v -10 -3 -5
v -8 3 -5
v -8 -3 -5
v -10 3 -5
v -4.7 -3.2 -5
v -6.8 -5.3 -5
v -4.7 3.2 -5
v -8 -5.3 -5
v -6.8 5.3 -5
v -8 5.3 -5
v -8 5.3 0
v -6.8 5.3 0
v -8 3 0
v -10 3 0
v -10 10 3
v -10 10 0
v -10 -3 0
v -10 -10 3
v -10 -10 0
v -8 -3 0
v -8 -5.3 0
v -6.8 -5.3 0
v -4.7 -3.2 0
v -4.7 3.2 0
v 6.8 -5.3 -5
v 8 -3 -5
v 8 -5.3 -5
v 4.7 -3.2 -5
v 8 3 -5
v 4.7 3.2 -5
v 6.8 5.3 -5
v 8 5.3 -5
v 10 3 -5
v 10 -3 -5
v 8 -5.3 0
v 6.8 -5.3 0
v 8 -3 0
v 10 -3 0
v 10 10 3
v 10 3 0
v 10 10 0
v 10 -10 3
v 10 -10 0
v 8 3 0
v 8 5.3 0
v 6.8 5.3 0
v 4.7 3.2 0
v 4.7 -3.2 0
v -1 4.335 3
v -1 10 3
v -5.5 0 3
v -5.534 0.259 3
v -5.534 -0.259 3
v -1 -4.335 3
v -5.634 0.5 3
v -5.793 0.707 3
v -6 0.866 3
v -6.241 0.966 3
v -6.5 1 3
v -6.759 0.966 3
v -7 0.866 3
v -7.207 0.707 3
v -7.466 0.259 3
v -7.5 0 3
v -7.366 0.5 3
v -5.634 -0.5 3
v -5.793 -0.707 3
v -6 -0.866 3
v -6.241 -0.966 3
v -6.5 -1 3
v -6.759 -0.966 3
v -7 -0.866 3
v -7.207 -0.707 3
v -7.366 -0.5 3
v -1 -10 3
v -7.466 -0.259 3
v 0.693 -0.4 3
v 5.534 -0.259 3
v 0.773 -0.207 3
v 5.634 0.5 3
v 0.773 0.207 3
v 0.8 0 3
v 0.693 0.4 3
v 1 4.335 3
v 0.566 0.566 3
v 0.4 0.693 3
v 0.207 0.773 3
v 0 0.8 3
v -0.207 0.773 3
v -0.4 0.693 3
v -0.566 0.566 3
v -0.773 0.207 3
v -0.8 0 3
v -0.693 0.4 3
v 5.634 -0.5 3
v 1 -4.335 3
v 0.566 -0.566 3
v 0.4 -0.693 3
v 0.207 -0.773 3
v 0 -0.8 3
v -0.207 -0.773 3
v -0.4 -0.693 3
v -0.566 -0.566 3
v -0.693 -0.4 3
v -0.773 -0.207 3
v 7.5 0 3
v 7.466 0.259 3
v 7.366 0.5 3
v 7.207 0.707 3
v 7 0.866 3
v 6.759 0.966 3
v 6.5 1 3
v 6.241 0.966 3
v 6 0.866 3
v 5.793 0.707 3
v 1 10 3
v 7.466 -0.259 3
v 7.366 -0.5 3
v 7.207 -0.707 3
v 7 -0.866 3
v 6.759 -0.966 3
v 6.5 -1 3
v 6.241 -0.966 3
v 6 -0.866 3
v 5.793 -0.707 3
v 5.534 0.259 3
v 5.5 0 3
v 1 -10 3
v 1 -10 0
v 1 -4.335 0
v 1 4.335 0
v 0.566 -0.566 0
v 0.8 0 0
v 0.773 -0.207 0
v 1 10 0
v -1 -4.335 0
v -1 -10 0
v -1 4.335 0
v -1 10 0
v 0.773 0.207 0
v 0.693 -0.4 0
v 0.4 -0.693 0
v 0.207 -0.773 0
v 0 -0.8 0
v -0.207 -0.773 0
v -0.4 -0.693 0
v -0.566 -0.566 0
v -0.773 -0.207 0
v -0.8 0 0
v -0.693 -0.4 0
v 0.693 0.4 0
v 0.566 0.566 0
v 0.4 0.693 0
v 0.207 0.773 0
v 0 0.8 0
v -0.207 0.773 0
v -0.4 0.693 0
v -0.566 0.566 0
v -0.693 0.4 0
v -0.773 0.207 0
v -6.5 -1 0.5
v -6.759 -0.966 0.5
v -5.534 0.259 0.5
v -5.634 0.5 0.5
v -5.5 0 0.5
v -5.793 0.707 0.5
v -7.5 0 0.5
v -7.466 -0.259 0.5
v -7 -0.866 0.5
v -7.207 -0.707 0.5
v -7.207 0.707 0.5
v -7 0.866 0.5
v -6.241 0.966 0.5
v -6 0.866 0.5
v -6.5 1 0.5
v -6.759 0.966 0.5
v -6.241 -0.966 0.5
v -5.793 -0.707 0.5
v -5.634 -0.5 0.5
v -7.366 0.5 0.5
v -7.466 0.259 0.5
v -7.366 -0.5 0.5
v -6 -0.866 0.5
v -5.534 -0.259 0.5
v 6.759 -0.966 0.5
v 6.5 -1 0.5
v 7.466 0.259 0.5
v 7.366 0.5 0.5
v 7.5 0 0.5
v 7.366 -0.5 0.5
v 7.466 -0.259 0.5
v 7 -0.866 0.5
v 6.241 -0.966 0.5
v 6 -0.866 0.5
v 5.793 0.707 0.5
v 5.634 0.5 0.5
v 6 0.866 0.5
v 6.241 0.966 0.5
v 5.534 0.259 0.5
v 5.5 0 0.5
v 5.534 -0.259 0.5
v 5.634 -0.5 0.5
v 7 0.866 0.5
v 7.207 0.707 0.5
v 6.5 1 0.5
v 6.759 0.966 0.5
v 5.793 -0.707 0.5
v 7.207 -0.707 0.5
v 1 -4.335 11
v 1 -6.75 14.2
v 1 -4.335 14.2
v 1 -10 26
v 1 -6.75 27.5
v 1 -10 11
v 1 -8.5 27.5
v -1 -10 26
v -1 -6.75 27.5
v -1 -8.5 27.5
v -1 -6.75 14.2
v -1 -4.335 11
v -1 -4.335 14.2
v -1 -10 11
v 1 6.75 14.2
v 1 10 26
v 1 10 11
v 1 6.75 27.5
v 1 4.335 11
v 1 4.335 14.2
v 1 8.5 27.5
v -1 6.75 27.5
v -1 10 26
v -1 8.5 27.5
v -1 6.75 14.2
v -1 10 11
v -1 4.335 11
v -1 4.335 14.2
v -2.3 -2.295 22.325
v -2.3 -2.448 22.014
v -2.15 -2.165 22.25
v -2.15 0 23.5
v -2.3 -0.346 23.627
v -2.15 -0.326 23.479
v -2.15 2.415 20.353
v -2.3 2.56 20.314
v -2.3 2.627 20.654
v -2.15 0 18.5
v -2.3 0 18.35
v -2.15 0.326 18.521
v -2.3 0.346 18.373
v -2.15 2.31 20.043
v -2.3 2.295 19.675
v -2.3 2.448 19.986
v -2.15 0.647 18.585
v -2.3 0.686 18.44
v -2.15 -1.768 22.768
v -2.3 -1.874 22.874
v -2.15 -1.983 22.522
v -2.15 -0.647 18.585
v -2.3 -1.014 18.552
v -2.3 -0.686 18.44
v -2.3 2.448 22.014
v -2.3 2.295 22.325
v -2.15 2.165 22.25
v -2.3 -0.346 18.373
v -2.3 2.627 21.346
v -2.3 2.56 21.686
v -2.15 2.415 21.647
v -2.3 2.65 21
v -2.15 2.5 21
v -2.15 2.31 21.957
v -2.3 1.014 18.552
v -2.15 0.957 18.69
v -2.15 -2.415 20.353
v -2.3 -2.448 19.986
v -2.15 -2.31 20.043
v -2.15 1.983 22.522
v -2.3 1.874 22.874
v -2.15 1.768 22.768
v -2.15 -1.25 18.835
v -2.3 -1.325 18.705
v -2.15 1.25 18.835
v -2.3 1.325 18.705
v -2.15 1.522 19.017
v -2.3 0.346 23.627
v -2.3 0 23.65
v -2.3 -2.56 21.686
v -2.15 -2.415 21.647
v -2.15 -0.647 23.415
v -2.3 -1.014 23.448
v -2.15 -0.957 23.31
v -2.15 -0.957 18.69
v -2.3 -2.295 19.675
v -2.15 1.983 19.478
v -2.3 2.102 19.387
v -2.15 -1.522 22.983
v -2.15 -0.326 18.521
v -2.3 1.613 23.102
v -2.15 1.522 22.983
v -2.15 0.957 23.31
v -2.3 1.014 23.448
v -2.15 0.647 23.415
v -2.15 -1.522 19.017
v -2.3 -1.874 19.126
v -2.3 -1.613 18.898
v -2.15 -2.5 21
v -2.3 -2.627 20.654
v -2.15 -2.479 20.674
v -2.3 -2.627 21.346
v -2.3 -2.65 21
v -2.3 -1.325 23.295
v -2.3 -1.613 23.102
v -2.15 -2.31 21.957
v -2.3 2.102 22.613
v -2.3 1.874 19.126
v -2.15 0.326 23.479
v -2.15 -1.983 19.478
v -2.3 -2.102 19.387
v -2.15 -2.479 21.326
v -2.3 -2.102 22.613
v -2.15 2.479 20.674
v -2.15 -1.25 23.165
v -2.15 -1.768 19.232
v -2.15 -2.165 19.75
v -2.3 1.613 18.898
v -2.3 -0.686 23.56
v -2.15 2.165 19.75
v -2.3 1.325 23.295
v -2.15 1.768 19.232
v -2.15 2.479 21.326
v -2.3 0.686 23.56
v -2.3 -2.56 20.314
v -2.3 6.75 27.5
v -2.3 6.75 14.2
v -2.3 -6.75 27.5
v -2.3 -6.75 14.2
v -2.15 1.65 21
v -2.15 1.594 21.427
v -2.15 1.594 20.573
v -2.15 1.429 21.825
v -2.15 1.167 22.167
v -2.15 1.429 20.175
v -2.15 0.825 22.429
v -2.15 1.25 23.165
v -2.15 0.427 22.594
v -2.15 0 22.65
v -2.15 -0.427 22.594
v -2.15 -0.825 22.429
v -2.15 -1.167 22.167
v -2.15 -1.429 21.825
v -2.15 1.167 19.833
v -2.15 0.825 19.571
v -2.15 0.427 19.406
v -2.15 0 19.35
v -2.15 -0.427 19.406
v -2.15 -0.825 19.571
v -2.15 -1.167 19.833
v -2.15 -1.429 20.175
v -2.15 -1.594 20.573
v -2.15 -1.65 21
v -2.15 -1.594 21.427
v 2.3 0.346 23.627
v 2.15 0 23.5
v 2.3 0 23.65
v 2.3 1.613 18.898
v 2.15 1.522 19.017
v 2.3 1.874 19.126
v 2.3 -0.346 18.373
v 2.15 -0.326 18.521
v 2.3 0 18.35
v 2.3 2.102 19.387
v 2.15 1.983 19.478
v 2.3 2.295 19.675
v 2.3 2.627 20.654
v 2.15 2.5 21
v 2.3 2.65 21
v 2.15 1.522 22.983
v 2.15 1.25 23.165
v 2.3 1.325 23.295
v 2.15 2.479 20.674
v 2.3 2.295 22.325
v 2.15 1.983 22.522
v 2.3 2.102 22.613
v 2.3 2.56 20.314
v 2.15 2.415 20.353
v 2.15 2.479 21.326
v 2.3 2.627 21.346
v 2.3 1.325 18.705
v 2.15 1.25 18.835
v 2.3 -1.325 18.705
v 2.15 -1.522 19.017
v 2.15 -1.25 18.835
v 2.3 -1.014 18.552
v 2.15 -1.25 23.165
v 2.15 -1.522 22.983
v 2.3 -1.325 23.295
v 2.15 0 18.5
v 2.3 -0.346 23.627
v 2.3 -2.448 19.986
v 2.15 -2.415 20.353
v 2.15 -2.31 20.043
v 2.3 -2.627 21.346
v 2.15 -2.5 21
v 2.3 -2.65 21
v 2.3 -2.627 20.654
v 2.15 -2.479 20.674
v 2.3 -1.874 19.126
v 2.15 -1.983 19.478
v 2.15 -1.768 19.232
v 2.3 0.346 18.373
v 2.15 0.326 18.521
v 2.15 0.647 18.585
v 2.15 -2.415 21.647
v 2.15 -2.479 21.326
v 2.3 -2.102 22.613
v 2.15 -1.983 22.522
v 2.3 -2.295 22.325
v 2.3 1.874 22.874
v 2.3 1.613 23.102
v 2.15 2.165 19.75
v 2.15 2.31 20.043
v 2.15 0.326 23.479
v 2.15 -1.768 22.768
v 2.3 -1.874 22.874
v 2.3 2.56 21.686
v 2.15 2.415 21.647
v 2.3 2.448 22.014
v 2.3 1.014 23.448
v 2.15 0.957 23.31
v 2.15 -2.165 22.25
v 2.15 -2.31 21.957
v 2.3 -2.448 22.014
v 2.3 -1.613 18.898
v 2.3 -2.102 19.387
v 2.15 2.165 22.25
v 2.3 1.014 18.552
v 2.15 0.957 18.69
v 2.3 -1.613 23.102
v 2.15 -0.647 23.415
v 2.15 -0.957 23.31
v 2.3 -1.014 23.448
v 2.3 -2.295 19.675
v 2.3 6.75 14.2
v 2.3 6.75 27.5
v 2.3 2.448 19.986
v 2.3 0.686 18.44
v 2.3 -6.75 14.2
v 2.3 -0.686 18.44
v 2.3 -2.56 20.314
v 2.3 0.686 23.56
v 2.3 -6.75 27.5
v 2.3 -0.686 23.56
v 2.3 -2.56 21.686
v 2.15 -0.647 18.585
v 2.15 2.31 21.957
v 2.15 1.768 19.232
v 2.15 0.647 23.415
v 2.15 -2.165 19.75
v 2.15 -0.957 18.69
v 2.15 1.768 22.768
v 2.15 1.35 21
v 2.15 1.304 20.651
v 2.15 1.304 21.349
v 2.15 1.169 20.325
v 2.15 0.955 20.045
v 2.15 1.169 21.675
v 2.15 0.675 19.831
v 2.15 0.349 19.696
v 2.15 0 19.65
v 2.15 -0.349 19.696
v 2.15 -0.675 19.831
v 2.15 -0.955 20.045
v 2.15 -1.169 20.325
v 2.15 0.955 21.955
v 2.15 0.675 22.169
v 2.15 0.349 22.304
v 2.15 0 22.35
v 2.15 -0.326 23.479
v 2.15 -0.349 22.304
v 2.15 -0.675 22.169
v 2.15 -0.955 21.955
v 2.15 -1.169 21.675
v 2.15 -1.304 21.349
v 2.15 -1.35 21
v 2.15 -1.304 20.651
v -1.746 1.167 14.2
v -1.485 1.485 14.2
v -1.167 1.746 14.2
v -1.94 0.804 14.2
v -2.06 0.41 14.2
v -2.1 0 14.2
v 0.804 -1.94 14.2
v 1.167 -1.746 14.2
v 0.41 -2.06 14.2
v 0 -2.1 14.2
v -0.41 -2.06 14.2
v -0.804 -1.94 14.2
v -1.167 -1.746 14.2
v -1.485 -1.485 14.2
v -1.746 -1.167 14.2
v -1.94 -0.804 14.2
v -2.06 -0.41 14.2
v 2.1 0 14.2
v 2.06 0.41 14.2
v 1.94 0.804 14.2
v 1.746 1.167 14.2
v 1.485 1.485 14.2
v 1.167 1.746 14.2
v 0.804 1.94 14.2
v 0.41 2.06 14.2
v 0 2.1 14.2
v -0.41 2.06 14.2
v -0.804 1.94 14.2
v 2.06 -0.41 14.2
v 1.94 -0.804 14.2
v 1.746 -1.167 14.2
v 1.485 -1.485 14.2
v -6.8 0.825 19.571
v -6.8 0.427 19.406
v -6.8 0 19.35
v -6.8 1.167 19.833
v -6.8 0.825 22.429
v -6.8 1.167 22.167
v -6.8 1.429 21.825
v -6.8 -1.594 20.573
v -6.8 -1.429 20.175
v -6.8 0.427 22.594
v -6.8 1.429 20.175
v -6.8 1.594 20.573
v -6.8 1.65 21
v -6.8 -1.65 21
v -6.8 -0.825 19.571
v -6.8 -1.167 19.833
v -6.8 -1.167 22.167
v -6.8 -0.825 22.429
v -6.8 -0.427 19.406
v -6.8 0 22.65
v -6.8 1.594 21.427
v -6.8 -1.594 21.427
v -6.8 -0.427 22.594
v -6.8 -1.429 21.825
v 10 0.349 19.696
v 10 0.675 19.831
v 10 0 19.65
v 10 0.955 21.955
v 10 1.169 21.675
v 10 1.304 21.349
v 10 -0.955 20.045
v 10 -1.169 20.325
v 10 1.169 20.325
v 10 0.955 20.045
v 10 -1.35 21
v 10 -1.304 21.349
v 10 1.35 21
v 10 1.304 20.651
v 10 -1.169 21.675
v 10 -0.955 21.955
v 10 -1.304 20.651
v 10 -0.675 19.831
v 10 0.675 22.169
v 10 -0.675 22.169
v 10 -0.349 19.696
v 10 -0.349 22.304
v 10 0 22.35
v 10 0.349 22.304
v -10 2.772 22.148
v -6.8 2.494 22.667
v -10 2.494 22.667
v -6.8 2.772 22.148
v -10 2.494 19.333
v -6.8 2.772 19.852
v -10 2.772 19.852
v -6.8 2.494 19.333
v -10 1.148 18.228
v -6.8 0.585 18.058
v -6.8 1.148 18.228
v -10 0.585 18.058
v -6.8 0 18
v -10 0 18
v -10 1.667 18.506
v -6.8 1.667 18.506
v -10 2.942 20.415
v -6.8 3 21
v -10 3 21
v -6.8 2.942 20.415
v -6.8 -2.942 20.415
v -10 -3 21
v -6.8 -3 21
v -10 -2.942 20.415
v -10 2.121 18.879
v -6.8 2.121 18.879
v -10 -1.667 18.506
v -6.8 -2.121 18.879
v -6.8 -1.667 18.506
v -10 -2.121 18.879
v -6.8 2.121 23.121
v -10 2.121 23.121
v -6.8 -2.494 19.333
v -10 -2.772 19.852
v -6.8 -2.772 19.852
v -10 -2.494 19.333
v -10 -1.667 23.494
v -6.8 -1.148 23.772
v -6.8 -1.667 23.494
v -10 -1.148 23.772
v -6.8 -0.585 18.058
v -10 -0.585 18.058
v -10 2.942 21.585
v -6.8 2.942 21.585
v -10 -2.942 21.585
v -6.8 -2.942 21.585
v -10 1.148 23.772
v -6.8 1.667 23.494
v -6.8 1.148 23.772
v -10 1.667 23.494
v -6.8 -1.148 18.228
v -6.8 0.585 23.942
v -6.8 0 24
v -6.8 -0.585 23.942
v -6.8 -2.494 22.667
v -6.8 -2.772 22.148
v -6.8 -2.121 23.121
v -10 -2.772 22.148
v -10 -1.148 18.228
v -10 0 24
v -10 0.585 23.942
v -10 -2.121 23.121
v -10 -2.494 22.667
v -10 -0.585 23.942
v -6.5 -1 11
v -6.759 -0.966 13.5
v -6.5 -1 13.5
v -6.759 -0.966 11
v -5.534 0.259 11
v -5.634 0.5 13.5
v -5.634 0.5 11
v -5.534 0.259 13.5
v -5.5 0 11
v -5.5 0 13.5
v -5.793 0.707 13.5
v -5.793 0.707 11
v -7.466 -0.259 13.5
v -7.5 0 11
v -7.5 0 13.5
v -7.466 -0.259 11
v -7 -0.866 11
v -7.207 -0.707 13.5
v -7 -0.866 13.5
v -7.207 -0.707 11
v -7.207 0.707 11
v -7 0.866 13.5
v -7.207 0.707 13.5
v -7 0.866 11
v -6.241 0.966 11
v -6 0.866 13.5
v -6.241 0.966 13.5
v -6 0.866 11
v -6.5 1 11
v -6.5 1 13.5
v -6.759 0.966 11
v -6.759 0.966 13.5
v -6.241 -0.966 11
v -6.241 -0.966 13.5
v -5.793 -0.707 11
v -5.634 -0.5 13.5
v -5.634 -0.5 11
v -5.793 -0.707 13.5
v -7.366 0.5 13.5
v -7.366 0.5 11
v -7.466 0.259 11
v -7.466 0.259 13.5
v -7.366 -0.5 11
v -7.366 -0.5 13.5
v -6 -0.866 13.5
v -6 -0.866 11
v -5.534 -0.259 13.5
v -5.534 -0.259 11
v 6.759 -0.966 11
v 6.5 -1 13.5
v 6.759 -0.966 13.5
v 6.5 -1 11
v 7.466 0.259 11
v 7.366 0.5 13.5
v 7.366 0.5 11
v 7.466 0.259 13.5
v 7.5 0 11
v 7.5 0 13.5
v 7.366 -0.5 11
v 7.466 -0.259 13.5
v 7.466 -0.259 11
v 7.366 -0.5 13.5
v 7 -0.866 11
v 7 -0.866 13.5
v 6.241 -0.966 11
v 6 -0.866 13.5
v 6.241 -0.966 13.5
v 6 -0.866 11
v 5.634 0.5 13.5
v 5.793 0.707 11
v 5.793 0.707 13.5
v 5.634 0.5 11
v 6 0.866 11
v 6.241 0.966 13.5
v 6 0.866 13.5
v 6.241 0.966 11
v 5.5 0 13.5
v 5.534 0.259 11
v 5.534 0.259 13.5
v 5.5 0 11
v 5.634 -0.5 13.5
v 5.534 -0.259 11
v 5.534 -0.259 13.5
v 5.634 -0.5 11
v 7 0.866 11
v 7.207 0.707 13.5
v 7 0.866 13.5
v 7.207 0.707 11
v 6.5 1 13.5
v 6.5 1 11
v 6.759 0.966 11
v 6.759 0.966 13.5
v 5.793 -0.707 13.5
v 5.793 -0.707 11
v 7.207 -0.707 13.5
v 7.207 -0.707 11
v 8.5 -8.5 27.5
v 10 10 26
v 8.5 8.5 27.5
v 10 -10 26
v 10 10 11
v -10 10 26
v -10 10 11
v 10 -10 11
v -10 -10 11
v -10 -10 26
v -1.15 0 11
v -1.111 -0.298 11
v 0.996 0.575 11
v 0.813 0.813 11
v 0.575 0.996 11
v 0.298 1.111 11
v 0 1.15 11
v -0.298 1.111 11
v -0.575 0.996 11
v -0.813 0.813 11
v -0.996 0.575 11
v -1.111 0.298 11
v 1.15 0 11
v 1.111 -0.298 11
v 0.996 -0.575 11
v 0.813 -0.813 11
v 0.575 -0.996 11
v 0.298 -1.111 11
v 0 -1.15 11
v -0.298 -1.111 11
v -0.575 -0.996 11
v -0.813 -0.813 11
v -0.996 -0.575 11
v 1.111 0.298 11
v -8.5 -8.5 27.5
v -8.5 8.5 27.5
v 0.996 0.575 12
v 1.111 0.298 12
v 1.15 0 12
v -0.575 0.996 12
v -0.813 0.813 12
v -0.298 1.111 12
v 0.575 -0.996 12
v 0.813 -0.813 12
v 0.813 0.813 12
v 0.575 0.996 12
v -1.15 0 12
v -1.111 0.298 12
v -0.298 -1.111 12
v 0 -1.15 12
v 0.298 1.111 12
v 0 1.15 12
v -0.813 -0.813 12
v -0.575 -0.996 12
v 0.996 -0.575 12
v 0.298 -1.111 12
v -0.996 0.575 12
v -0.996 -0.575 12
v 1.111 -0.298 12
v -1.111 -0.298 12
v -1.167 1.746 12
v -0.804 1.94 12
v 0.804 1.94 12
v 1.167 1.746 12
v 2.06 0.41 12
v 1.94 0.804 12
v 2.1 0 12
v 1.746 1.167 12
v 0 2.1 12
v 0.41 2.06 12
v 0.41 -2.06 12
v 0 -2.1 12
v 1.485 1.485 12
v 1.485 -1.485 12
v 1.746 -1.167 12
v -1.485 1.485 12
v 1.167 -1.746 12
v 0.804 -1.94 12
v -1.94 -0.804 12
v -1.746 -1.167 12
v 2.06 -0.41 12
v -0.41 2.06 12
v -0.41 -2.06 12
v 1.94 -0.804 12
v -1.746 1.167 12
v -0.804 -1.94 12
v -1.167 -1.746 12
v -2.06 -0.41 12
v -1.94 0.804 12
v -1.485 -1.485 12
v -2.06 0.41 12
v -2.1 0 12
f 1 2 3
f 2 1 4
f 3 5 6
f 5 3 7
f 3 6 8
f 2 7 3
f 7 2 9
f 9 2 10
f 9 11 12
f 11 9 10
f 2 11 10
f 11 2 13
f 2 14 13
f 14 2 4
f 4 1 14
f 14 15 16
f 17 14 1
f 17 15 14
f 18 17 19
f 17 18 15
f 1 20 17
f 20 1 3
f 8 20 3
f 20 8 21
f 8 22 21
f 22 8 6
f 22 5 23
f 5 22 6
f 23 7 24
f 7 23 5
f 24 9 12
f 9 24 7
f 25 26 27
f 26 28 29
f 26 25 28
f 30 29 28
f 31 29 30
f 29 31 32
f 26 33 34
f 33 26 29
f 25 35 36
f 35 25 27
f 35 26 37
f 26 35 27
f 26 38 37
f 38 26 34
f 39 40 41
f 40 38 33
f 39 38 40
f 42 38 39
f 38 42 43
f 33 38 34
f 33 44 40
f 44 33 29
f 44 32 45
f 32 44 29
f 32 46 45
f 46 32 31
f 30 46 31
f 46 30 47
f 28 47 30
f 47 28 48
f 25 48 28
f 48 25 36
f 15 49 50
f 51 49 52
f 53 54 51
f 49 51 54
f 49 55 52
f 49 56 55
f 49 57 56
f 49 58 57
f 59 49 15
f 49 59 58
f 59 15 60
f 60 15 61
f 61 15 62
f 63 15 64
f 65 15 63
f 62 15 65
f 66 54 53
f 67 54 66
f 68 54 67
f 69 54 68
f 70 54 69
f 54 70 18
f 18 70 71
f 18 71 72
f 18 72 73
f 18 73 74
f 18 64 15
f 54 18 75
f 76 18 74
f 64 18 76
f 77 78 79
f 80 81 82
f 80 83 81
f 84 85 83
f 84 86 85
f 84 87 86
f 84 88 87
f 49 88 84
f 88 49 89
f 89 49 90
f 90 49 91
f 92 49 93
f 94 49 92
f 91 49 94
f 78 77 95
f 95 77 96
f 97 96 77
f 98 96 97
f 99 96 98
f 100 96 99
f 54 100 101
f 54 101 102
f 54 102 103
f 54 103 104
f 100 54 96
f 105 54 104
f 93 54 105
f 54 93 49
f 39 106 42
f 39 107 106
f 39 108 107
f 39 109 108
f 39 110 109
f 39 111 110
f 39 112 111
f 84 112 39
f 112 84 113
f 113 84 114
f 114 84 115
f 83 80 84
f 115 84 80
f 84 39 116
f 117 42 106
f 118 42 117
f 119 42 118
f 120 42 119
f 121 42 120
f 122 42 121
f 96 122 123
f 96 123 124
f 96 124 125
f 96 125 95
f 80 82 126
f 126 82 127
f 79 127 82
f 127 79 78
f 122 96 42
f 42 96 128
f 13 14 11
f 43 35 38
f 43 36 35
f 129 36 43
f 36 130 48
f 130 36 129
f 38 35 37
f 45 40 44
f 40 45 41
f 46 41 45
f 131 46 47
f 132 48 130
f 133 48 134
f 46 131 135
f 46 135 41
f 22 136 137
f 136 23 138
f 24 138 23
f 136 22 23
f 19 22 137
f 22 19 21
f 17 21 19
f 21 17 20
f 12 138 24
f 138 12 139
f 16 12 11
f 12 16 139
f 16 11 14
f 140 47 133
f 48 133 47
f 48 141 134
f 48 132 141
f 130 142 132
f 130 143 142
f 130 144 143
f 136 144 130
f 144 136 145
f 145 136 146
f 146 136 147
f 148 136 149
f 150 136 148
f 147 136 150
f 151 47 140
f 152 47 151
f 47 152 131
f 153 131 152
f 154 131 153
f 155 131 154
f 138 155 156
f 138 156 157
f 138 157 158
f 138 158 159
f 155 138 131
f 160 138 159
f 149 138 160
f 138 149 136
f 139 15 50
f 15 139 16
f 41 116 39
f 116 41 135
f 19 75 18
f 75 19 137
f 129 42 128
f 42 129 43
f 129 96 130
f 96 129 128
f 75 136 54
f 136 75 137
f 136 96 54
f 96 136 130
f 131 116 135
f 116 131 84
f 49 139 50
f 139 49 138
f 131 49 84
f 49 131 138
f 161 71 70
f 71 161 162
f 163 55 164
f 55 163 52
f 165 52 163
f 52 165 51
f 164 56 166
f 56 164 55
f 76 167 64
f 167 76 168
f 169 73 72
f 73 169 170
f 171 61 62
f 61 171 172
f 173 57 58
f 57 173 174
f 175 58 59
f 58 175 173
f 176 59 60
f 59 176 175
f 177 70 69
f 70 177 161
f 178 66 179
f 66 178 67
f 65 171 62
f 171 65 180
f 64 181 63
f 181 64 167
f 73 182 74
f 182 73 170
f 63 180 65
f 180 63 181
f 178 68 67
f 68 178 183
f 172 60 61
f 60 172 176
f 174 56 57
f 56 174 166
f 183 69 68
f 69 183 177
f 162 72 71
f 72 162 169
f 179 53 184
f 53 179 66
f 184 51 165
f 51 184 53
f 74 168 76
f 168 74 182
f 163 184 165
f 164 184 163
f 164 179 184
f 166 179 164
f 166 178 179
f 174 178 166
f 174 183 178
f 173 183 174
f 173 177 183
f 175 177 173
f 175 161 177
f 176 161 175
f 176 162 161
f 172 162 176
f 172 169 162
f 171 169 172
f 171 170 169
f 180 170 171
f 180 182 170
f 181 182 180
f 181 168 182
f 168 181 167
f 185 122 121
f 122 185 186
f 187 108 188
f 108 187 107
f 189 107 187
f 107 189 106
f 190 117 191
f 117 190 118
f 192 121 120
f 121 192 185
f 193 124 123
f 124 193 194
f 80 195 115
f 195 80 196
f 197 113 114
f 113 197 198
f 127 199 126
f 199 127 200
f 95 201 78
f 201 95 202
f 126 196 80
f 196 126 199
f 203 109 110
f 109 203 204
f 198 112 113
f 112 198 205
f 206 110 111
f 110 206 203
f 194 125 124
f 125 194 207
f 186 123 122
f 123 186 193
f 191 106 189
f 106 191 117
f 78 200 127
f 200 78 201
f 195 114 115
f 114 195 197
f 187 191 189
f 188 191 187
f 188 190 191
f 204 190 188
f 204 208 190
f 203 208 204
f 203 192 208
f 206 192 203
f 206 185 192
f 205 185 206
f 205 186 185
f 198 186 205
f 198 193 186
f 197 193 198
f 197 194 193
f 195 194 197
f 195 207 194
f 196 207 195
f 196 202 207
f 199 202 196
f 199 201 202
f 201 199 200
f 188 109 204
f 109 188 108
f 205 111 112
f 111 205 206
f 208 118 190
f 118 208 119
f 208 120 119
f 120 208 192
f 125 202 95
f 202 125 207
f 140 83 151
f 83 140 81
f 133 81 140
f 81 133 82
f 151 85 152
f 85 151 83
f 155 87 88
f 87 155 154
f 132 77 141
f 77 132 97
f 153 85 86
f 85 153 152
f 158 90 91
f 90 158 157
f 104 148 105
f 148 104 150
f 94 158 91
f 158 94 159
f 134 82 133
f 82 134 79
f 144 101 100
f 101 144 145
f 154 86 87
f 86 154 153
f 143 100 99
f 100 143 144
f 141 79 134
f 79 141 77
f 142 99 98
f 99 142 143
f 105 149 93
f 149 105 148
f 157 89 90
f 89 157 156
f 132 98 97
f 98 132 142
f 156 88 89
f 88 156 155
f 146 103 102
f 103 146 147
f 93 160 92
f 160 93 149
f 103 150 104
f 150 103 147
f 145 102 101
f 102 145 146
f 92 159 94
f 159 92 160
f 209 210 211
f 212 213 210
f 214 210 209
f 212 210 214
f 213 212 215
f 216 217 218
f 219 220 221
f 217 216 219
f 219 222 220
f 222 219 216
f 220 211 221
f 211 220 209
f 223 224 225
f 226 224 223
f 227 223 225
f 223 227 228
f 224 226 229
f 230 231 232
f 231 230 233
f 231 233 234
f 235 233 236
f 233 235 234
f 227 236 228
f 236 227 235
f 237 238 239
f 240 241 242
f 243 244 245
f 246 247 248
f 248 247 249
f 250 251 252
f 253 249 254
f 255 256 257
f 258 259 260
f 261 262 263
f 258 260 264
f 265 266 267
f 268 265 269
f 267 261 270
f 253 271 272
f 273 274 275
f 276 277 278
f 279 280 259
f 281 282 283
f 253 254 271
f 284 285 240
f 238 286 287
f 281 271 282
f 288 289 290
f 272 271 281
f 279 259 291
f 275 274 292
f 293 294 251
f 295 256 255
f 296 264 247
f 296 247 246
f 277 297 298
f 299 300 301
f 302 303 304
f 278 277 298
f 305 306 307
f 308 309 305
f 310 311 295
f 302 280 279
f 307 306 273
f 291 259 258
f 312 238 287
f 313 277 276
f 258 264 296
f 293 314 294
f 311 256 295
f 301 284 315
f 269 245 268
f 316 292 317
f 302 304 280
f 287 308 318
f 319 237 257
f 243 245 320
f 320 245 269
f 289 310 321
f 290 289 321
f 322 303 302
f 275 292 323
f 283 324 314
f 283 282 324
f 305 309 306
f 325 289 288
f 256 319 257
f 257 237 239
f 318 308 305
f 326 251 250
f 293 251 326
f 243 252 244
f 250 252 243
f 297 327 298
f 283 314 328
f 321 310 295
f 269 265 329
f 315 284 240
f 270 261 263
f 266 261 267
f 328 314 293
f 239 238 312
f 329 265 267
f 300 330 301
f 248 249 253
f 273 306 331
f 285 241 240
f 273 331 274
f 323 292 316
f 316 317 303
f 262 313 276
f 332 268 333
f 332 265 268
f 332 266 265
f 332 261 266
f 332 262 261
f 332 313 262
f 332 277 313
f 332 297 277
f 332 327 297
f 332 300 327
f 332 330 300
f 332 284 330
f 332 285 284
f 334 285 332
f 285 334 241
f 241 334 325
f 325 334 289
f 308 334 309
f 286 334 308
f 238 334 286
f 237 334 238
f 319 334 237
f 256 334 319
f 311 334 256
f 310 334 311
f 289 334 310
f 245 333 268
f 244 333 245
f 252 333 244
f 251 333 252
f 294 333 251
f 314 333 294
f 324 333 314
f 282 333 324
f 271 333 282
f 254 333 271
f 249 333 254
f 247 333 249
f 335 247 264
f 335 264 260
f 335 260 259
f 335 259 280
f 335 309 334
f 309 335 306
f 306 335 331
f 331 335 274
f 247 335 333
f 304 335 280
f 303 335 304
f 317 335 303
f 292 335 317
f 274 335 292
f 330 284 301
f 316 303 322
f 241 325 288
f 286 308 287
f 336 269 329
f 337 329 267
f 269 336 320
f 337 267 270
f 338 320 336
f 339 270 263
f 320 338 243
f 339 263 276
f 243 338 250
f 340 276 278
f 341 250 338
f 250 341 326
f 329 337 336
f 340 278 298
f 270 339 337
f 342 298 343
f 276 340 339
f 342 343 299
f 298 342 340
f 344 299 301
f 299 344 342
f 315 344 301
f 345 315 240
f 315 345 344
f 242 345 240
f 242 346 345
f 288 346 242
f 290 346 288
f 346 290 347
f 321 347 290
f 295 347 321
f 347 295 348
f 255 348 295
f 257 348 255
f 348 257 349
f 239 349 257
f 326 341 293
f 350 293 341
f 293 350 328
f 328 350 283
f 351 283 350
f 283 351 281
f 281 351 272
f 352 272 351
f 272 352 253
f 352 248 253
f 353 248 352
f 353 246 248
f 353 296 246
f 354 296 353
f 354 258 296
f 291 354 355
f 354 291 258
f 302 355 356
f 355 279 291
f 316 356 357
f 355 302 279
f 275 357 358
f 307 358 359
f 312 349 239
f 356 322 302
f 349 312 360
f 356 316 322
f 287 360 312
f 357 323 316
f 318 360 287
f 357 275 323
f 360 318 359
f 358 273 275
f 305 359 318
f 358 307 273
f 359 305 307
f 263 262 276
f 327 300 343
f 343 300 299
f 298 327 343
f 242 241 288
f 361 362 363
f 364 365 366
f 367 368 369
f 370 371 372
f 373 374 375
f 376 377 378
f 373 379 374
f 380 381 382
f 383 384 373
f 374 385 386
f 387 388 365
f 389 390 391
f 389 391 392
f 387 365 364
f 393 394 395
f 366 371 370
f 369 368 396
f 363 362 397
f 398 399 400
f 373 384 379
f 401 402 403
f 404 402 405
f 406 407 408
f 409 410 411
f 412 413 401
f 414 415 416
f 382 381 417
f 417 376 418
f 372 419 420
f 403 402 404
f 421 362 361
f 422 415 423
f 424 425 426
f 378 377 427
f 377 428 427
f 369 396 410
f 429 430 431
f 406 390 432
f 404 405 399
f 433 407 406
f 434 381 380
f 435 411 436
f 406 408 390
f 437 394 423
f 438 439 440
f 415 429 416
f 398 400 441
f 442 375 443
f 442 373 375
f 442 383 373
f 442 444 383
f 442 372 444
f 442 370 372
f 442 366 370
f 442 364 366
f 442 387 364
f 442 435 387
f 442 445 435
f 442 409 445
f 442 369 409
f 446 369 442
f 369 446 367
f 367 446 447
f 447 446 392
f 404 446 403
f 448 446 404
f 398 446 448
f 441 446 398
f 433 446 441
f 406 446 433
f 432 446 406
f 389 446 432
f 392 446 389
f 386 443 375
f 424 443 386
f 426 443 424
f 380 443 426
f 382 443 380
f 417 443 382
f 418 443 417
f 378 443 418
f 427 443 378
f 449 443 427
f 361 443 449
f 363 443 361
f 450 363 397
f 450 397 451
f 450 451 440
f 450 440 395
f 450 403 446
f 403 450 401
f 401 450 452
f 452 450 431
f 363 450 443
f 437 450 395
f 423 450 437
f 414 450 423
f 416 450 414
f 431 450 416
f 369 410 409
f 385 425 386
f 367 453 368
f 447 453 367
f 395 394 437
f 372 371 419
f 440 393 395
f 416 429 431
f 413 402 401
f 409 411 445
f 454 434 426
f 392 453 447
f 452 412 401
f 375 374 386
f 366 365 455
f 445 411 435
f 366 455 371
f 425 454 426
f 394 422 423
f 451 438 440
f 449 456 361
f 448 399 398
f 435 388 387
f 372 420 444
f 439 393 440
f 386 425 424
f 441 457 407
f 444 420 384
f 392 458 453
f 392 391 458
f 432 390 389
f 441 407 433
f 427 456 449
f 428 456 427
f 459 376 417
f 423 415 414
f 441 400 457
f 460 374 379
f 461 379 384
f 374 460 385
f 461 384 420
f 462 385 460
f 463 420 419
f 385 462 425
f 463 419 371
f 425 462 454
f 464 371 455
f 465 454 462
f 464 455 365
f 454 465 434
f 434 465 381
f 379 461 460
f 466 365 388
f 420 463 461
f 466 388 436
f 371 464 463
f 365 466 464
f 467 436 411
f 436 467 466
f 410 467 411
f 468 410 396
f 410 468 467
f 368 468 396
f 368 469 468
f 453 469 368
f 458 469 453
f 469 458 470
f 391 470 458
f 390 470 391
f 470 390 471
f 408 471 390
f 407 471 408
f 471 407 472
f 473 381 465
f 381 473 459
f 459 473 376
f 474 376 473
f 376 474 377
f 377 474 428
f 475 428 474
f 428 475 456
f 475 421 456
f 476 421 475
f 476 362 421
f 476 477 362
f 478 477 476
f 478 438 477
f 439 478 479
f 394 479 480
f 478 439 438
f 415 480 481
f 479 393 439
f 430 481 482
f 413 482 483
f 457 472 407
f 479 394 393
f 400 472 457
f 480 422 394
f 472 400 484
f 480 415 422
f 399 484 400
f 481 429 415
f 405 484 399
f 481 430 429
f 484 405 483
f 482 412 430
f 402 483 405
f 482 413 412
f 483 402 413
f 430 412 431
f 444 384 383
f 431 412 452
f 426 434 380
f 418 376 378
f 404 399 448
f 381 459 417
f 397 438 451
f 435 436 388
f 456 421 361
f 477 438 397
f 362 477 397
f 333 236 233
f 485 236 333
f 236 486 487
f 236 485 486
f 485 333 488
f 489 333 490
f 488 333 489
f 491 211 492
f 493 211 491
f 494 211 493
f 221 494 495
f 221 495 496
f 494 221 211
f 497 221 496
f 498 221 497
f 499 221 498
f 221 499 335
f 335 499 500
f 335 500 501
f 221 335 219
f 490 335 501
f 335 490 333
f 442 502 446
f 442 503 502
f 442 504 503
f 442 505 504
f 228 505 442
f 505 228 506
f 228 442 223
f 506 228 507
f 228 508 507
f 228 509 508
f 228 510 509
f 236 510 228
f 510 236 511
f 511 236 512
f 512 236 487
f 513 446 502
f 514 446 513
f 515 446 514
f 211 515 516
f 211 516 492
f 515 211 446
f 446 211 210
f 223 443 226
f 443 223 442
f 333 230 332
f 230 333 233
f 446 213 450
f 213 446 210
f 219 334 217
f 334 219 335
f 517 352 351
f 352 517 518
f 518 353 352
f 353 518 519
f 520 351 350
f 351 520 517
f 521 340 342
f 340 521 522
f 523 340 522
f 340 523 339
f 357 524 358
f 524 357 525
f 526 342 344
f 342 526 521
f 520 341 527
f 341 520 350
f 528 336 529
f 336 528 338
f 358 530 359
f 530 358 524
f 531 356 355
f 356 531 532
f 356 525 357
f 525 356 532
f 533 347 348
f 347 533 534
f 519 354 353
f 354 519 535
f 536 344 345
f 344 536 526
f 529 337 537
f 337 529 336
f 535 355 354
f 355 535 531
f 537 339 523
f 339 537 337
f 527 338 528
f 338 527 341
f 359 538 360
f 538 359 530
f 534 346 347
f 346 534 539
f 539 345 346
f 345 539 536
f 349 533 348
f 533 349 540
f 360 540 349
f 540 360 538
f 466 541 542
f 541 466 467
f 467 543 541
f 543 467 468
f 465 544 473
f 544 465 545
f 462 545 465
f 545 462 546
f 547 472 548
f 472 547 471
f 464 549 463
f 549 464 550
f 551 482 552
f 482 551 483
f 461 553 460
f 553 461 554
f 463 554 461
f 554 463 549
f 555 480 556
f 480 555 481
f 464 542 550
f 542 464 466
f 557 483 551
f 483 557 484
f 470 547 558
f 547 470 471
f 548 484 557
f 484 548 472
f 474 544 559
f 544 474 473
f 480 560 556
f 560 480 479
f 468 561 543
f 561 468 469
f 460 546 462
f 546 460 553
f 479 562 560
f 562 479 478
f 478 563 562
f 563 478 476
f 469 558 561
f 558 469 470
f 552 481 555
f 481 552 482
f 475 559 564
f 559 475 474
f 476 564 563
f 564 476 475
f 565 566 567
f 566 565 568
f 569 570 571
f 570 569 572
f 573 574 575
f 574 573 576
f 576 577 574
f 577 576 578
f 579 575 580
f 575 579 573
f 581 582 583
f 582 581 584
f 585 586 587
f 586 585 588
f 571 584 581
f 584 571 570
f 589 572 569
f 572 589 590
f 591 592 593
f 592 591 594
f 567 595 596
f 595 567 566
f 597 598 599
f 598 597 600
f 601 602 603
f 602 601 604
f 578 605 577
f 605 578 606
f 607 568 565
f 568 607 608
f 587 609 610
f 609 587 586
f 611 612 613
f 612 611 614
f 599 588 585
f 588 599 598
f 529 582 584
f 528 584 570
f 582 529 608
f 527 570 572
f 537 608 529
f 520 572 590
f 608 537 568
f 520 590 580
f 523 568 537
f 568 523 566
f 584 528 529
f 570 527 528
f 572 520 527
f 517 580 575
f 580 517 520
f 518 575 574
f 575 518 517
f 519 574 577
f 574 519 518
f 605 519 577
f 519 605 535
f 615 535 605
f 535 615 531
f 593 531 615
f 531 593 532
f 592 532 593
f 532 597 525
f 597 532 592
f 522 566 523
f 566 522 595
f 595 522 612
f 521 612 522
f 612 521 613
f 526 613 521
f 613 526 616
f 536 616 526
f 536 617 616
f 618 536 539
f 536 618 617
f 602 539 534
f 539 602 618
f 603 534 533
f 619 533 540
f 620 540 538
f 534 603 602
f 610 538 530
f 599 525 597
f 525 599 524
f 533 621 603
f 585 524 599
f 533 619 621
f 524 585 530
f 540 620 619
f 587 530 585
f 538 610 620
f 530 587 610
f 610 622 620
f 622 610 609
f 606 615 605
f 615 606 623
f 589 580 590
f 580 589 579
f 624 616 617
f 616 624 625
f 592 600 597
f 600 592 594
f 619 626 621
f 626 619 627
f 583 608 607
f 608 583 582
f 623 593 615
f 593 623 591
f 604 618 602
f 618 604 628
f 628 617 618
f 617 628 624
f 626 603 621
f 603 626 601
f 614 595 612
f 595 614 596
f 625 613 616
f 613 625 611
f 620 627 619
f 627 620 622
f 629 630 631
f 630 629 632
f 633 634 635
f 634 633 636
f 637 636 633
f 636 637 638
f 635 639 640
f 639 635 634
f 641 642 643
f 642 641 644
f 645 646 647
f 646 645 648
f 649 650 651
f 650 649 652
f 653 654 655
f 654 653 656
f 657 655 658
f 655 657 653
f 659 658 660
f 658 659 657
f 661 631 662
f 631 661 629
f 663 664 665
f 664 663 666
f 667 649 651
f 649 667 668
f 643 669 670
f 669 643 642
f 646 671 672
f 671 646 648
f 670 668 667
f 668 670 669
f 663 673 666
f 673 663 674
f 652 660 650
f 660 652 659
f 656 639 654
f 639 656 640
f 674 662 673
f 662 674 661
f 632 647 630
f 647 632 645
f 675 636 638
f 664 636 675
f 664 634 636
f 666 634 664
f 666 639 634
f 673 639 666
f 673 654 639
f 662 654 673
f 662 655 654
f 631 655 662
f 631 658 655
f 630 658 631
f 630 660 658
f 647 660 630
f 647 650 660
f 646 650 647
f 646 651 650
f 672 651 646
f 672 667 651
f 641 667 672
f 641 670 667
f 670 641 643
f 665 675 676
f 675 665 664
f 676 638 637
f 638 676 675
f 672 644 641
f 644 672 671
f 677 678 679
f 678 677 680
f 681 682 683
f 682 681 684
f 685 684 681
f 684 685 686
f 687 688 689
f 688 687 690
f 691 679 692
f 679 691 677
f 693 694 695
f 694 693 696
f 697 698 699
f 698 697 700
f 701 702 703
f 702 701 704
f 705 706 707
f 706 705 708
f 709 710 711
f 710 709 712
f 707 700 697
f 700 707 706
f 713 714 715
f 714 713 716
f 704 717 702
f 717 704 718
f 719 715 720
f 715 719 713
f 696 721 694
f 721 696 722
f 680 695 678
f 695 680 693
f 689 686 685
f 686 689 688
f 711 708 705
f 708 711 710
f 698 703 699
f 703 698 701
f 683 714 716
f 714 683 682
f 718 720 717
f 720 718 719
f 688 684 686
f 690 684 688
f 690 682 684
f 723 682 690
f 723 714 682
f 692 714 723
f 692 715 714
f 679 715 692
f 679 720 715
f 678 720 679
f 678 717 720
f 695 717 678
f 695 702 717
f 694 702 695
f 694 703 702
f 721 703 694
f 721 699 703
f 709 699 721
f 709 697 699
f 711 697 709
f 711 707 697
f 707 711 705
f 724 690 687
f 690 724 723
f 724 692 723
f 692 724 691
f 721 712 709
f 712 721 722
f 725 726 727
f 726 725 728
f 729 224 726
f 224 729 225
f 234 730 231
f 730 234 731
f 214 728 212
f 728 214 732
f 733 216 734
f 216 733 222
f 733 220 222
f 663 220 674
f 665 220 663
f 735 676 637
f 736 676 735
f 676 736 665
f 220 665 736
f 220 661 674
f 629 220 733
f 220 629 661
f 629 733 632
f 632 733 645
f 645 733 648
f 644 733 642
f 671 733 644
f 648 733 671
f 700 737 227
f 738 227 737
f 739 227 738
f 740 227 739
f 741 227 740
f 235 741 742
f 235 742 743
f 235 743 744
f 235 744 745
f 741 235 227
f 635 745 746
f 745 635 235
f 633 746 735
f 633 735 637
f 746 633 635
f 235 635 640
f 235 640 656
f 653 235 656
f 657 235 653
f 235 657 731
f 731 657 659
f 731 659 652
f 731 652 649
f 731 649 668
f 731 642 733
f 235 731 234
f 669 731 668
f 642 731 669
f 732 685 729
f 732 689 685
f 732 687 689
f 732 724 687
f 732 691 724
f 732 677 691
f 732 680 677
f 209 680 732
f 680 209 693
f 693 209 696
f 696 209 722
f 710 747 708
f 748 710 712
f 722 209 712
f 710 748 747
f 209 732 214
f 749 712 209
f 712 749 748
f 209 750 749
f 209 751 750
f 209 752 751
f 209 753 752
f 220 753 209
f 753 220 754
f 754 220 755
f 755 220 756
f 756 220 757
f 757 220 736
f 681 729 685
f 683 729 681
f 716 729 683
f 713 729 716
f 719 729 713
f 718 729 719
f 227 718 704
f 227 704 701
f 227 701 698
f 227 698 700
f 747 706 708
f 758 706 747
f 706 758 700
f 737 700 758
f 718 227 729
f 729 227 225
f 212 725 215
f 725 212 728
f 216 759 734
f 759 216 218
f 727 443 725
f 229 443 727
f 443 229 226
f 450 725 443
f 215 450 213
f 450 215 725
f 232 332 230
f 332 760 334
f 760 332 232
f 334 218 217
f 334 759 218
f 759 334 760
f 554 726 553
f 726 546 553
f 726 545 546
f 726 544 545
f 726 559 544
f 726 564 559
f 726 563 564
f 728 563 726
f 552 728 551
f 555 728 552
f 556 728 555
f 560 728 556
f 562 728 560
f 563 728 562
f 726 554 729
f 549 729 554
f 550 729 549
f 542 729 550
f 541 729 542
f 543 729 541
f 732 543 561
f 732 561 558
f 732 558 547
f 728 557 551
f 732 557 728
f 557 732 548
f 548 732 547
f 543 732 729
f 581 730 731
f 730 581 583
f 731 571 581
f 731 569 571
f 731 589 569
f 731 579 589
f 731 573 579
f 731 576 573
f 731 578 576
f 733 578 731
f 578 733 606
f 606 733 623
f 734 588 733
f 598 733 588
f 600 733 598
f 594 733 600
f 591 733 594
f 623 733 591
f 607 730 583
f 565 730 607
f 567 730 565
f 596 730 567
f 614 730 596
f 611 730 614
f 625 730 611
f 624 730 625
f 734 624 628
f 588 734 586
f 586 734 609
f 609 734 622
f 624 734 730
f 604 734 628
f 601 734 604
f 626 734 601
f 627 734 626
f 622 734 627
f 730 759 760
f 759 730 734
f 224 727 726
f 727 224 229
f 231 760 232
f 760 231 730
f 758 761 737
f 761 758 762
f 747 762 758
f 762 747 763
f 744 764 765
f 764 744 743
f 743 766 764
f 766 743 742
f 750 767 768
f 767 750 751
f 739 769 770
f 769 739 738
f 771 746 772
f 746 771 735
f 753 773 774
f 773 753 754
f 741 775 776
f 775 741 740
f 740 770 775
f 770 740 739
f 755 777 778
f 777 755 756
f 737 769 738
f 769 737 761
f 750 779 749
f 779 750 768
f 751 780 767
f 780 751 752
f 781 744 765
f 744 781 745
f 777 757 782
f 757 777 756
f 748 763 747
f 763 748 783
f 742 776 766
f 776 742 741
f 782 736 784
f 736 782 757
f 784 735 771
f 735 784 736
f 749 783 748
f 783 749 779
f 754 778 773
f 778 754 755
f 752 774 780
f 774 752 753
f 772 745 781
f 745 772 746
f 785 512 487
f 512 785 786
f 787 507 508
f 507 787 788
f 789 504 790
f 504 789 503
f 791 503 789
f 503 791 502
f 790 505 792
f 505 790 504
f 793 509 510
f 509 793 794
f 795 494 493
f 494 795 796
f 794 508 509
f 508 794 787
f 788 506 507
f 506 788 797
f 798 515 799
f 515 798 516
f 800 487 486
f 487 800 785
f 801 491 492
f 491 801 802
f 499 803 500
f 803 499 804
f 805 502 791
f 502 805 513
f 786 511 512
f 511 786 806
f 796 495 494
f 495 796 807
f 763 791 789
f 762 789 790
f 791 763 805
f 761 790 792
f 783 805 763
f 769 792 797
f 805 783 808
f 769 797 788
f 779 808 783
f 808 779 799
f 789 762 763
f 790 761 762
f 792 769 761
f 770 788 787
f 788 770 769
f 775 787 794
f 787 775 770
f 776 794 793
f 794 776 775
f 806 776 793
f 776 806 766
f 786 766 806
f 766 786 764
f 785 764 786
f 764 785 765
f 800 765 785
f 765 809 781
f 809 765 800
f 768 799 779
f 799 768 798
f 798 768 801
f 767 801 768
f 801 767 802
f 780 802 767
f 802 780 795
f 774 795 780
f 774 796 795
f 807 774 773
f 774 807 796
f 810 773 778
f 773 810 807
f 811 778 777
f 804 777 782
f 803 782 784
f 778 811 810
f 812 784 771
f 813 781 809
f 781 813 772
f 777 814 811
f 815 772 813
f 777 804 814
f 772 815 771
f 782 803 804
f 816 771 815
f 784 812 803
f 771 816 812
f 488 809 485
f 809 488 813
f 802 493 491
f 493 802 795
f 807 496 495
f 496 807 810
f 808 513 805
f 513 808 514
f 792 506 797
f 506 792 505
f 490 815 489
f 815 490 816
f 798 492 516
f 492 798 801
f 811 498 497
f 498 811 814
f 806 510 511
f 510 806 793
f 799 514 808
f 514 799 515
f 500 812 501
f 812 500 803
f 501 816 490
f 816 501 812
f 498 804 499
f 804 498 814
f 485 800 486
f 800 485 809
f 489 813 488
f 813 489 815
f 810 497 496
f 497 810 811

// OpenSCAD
// file: spine-cap.scad
// Spine cap, v3: a square 20 x 20 block that plugs into the top of the
// vertical 2020 and carries the balance line over it in a 45 degree V groove.
// The line comes up the spine's front slot from the carriage, crosses the top,
// and drops THROUGH the cap into the rear slot's channel, so it runs down
// inside the channel to the load stack's T slider (load-stack.scad). No
// guide line anchors any more: Matt tried guide lines on the rig, 2026-09-19,
// and gave them up for the rail's own channel.
//
// Press fit from the rail's own geometry: a tee tab into each SIDE slot,
// stem a touch wider than the slot opening, head a diamond under the lips
// with every face at 45 degrees or vertical. No centre peg. The front and
// rear slots are left open.
//
// Cut for plain T-slot 2020, not V-slot: a 6 mm straight opening, lips about
// 1.8 thick, an 11 mm channel. Measure the rail: slot_w is what the fit
// rides on, and generic extrusion runs 6.0 to 6.3.
//
// The top's front edge is chamfered 45 degrees and the V groove follows the
// chamfer down to the face, so the line bends twice by 45 on its way down to
// the carriage. At the rear the groove runs level to drop_y, where a thin slit
// goes down through the cap into the channel and out through the rear face,
// so the line is laid in with the cap on and sits at the slit's front end.
//
// Printed upside down (print_flip = true, which the STL is): the top face is
// on the bed, the V groove is a 45 degree cavity, the chamfer a 45 degree
// overhang, the tabs stand up. No support.
//
// Friction: a groove is a capstan and the line wraps 180 degrees. At 10 N
// hanging and mu ~0.15 on smooth PLA that is about 3.8 N to raise the arm
// and 6 N to lower it. Keep the groove smooth; a pulley is the fallback.
rail        = 20;
// Plain T-slot 2020. Measure yours.
slot_w      = 6.0;     // opening at the face
lip_t       = 1.8;     // face to the underside of the lip
chan_w      = 11;      // channel width just under the lips
chan_str    = 1.6;     // how far below the lips the channel stays full width, before it angles in at 45
chan_d      = 5.5;     // face to the deepest the tab may go
cap_h       = 5;       // above the rail's end
groove_w    = 3;       // at the surface; 45 degree walls, so 1.5 deep
edge_c      = 1.5;     // chamfer on the front top edge; the groove follows it, so at least groove_d
side_c      = 1.5;     // chamfer on the rear and side top edges, the same
tab_len     = 5;       // into the rail
tab_fit     = 0.0;     // a side, in the opening: 0.1 sheared on the first print, printed stems run fat anyway
tab_clr     = 0.2;     // a side, everywhere else
drop_y      = 8.0;     // the slit's front end: the line drops here into the channel, at load-stack.scad's line_y
drop_slit   = 1.2;     // a thin slit from there out through the rear face
print_flip  = false;   // top face down, tabs up
show_context = false;  // rail stub and the two line runs; preview only
$fn = 48;

half       = rail/2;
groove_d   = groove_w/2;
// Tab, distances from the rail centre: stem through the opening to just under
// the lip, then a head full width for the channel's straight part, then 45
// degrees in to the bottom: the shape of a 2020 channel. The first cut was a
// diamond widest 4 mm down, where the channel has already narrowed, and it
// sheared going in.
stem_h     = slot_w/2 + tab_fit;
stem_top   = half - lip_t - tab_clr;          // underside of the lip
head_h     = chan_w/2 - tab_clr;              // full width
head_y     = half - lip_t - chan_str + tab_clr;   // down to where the channel angles in
bottom_y   = half - chan_d + tab_clr;         // deepest point
bottom_h   = head_h - (head_y - bottom_y);    // half width there

assert(groove_d < cap_h - 1, "groove through the cap");
assert(edge_c >= groove_d, "chamfer shallower than the groove");
assert(bottom_h > 1.5, "tab bottom too narrow: raise chan_d or chan_str");
assert(head_y > bottom_y, "channel too shallow for the head");
echo(str("cap ", cap_h, " high; tab stem ", 2*stem_h, " wide, head ", 2*head_h,
         " wide from ", half - stem_top, " to ", half - head_y, " below the face, then 45 in to ",
         2*bottom_h, " wide at ", half - bottom_y));

module tab_2d() {   // for the +Y slot, y outward; rotated to the side slots
    polygon([
        [-stem_h, half], [-stem_h, stem_top], [-head_h, stem_top], [-head_h, head_y],
        [-bottom_h, bottom_y], [ bottom_h, bottom_y],
        [ head_h, head_y], [ head_h, stem_top], [ stem_h, stem_top], [ stem_h, half]
    ]);
}
module tabs() {
    for(a=[90, -90]) rotate([0,0,a]) translate([0,0,-tab_len]) linear_extrude(tab_len + 0.01) tab_2d();
}

// Body: YZ profile with the two chamfers, extruded across X.
module body_2d() {   // YZ: front chamfer edge_c, rear chamfer side_c
    polygon([[-half, 0], [half, 0], [half, cap_h - side_c], [half - side_c, cap_h],
             [-half + edge_c, cap_h], [-half, cap_h - edge_c]]);
}
module sides_2d() {  // XZ: side chamfers
    polygon([[-half, 0], [half, 0], [half, cap_h - side_c], [half - side_c, cap_h],
             [-half + side_c, cap_h], [-half, cap_h - side_c]]);
}
module yz(w) { rotate([90,0,90]) linear_extrude(w, center=true) children(); }

// V cutter cross-section: apex groove_d below the surface, flared above it.
module vee_2d() {
    polygon([[-groove_w/2 - 1, 1], [-groove_w/2, 0], [0, -groove_d], [groove_w/2, 0], [groove_w/2 + 1, 1]]);
}
// The V section at a point on the path, tilted about X by `tilt` so it stays
// square to the surface (0 on the top, -45 down the rear chamfer).
module vee_at(y, z, tilt) {
    translate([0, y, z]) rotate([tilt, 0, 0]) rotate([90,0,0]) linear_extrude(0.02, center=true) vee_2d();
}
module groove() {
    yt = half - edge_c;   // front chamfer starts
    e  = 1.5;             // run past the face
    hull() { vee_at(-yt, cap_h, 22.5); vee_at(half + e, cap_h, 0); }
    hull() { vee_at(-yt, cap_h, 22.5); vee_at(-half - e, cap_h - edge_c - e, 45); }
}

assert(drop_y + drop_slit/2 < half, "drop slit starts outside the rear face");
assert(groove_d >= side_c, "rear chamfer reaches down to the drop hole mouth");
module drop() {
    hull() for(y=[drop_y, half + 1]) translate([0, y, -1]) cylinder(h=cap_h + 2, d=drop_slit, $fn=16);
    // eased front end, where the line turns down out of the groove
    translate([0, drop_y, cap_h - groove_d - 1]) cylinder(h=1.01, d1=drop_slit, d2=drop_slit + 2, $fn=16);
}
module spine_cap() {
    difference() {
        union() {
            intersection() { yz(rail) body_2d(); rotate([90,0,0]) linear_extrude(rail + 2, center=true) sides_2d(); }
            tabs();
        }
        groove();
        drop();
    }
}

if(print_flip) translate([0,0,cap_h]) rotate([180,0,0]) spine_cap();
else spine_cap();

if(show_context && !print_flip) %union() {
    translate([0,0,-60]) color([0.66,0.71,0.75]) linear_extrude(60) difference() {
        square(rail, center=true);
        for(a=[0:90:270]) rotate(a) {
            translate([-slot_w/2, half - lip_t]) square([slot_w, lip_t + 1]);
            translate([-chan_w/2, half - chan_d]) square([chan_w, chan_d - lip_t]);
        }
    }
    color([0.1,0.7,0.9]) for(y=[-half, half])
        translate([0, y, -60]) cylinder(h=60 + cap_h - edge_c, d=0.6, $fn=8);
}
// main file
// Spine cap, pulley version: a closed 20 x 20 hood over the top of the
// vertical 2020 with a small pulley inside it. Replaces spine-cap.scad's V
// groove, which Matt found too stiff on the rig (2026-09-20): a groove is a
// 180 degree capstan, 4 to 6 N at 10 N hanging. The pulley is one from his
// parts box: 12 OD, 10.3 at the line, 4 wide, a ball bearing on a 3 mm bore.
//
// One pulley is enough because of where the rail's slots are. With the
// 0.37 braid on, the two runs leave the pulley 10.7 apart, and the front and
// rear slot channels are 4.3 deep each side of a 7.8 core. Centred on the
// rail's axis, axle across X, the pulley drops both runs into the channels,
// 4.65 under each face. The rear run goes straight down the channel through
// the load stack's slit sliders (load-stack.scad; the slits run the sliders'
// full depth, so 5.35 from centre suits them as well as 8 did). The front run
// angles out through the slot's opening to the gantry plate's tie hole, 6 mm
// in front of the face: at x = 0 the rail has no metal outboard of the
// channel floor, so the line touches nothing, and the angle is in the
// pulley's plane. A slit up the hood's front wall lets it through as the
// carriage nears the top and the angle opens.
//
// The rail's core is solid under the pulley, so the pulley sits above the
// rail's end and the hood is as tall as that makes it. The line's load, about
// twice what hangs, presses the hood onto the rail; the tee tabs in the side
// slots (spine-cap.scad's, unchanged) only have to keep it there when slack.
//
// Axle: an M3 x 16 cap head across X, head sunk in one side, self-tapping
// into a pilot in the other. The bearing sits on the thread, which is fine:
// nothing turns on it. Two low bosses on the pocket's walls bear on the
// bearing's inner race and keep the pulley's flanges off the walls. The
// pocket is too narrow beside the pulley for the braid to drop past it.
//
// Assembly: lay the line over the pulley, push the pulley up into the
// pocket, run the screw through, press the hood onto the rail.
//
// Open for now (open_top, Matt 2026-09-20): no roof, so the pulley can be
// watched and got at, and the pulley raised onto a flat floor across the
// rail's end, so the cap has a clean base. The pocket is then a trough open
// upward, and the slit is cut at both ends, full height and through the
// floor to run_y, so the line is laid in from above with the cap on the rail:
// pulley out, line down both slits, pulley and screw back. open_top = false
// gives the closed hood back: roof, no floor, the pocket open to the rail and
// the one slit at the front.
//
// Two parts (part = plate | block | pair, Matt 2026-09-20): the one-piece
// open cap was tricky to print, tabs on one end and a trough on the other, so
// neither end is a good bed face. Split at the rail's end, each half gets one.
// The PLATE is the rail interface, split_t thick with the tee tabs under it,
// printed upside down with its flat top on the bed. The BLOCK is the pulley's
// trough and cheeks on a flat base, printed as it stands. One M2 down the
// middle joins them: head sunk in the trough's floor under the pulley, thread
// cut into a pilot in the plate, tip free in the rail's Ø4.2 bore. The line's
// load clamps the joint anyway; the screw only locates it. One screw leaves
// yaw to friction, so both faces also carry two blind Ø2 holes for stubs of
// 1.75 filament as dowels. Both faces are bed faces, so holes are all the
// registration they can have. Both parts carry the two slits.
//
// part = "cap" is the one piece, open or closed by open_top. It prints upside
// down (print_flip): rims or roof on the bed, tabs standing, and when open
// the floor bridging the pocket's 4.6.
use <spine-cap.scad>
rail        = 20;
pulley_od   = 12;
pulley_line = 10.3;    // diameter at the groove's root
pulley_w    = 4;
axle        = 3;
line_d      = 0.37;
part        = "pair";  // [pair, plate, block, cap]
open_top    = true;    // cap only: no roof, flat floor, slits both ends
floor_t     = 2;       // open cap: floor across the rail's end
split_t     = 3;       // two part: the plate, on the rail's end
block_floor = 3.2;     // two part: the block's floor, which sinks the M2's head
m2_clear    = 2.3;
m2_pilot    = 1.6;     // self-tapping into the plate
m2_head_d   = 4.2;     // cap head 3.8; must pass down the pocket
m2_head_h   = 2.2;     // cap head 2.0
m2_len      = 8;
dowel_d     = 2.0;     // 1.75 filament
dowel_h     = 2.5;     // into each face
dowel_x     = 6.5;     // either side of centre, under the cheeks
rim_over    = 0.5;     // open only: walls this far above the pulley's rim
lift        = 0.8;     // pulley's rim above the floor, or the rail's end
rim_clr     = 0.75;    // pocket round the pulley's rim
side_clr    = 0.3;     // pocket beside the pulley, a side: less than the braid
boss_h      = 0.15;    // bosses on the pocket walls, onto the inner race
boss_d      = 5;       // the inner race; keep under the bearing's outer ring
roof        = 1.6;
edge_c      = 1.5;     // chamfer on all four top edges
axle_clear  = 3.3;     // head side
axle_pilot  = 2.7;     // M3 self-tapping into the far wall
head_d      = 6;       // cap head 5.5
head_sink   = 3.2;
screw_l     = 16;
front_slit  = 2;       // slit width: front wall only when closed, both ends when open
print_flip  = false;   // plate and cap only: top face down, tabs up
show_context = false;  // rail stub, pulley and the two runs; preview only
$fn = 48;

half     = rail/2;
two_part = part != "cap";
open     = open_top || two_part;
base     = two_part ? block_floor : open_top ? floor_t : 0;
pz       = base + lift + pulley_od/2;          // axle height above the rail's end
pocket_w = pulley_w + 2*side_clr;
pocket_d = pulley_od + 2*rim_clr;
cap_h    = open ? pz + pulley_od/2 + rim_over : pz + pocket_d/2 + roof;
run_y    = (pulley_line + line_d)/2;           // each run, from the rail's centre
wall     = (rail - pocket_w)/2;
screw_end = -half + head_sink + screw_l;       // x of the screw's tip

// 2020 channel: 3.9 to 8.2 from centre at x = 0 (datasheets/section-properties.md).
assert(run_y > 3.9 + 0.5 && run_y < 8.2 - 0.5, "runs miss the slot channels");
assert(side_clr - boss_h < line_d, "the braid can drop past the pulley");
assert(screw_end < half && screw_end > pocket_w/2 + 4, "screw length does not suit the walls");
assert(edge_c < wall - head_d/2 || pz + head_d/2 < cap_h - edge_c, "head counterbore breaks the chamfer");
assert(!two_part || m2_head_d < pocket_w, "the M2's head will not pass down the pocket");
assert(!two_part || block_floor - m2_head_h >= 1, "too little floor under the M2's head");
assert(!two_part || m2_len > block_floor - m2_head_h + split_t, "M2 too short to come through the plate");
assert(!two_part || dowel_h < split_t, "dowel holes through the plate");
if(two_part) echo(str("plate ", split_t, " + block ", cap_h, " = ", split_t + cap_h, " above the rail's end; M2 x ", m2_len,
         " has ", block_floor - m2_head_h, " under its head, ", split_t, " of thread, ",
         m2_len - (block_floor - m2_head_h) - split_t, " spare in the rail's bore"));
echo(str(two_part ? "block " : open ? "open cap " : "hood ", cap_h, " high; axle ", pz, " above the rail's end; runs ", run_y, " from centre, ",
         half - run_y, " under each face; pocket ", pocket_w, " x ", pocket_d, "; M3 x ", screw_l,
         " reaches ", screw_end - pocket_w/2, " into the far wall"));

module body() {
    hull() {
        translate([0, 0, (cap_h - edge_c)/2]) cube([rail, rail, cap_h - edge_c], center=true);
        translate([0, 0, cap_h - 0.005]) cube([rail - 2*edge_c, rail - 2*edge_c, 0.01], center=true);
    }
}
// Closed, a tombstone: round the pulley above the axle, straight down to the
// rail. Open, a trough from the floor up through the top.
module pocket() {
    difference() {
        if(open) translate([-pocket_w/2, -pocket_d/2, base]) cube([pocket_w, pocket_d, cap_h]);
        else union() {
            translate([0, 0, pz]) rotate([0,90,0]) cylinder(h=pocket_w, d=pocket_d, center=true);
            translate([0, 0, (pz - 1)/2]) cube([pocket_w, pocket_d, pz + 1], center=true);
        }
        for(s=[-1, 1]) translate([s*pocket_w/2, 0, pz]) rotate([0, -s*90, 0])
            cylinder(h=boss_h, d1=boss_d + 2*boss_h, d2=boss_d);
    }
}
module axle_hole() {
    translate([0, 0, pz]) rotate([0,90,0]) {
        translate([0,0,-half - 1]) cylinder(h=half + 1, d=axle_clear, $fn=24);
        cylinder(h=half + 1, d=axle_pilot, $fn=24);
        translate([0,0,-half - 1]) cylinder(h=head_sink + 1, d=head_d, $fn=32);
    }
}
// Closed: from the pocket out through the front face, rail's end up to the
// axle. Open: both ends, full height, and through the floor in to the runs.
module slit() {
    if(open) for(s=[-1, 1]) scale([1, s, 1])
        translate([-front_slit/2, run_y - front_slit/2, -1]) cube([front_slit, half + 1 - run_y + front_slit/2, cap_h + 2]);
    else translate([-front_slit/2, -half - 1, -1]) cube([front_slit, half + 1 - pocket_d/2 + 1, pz + 1]);
}
module spine_cap_pulley() {
    difference() {
        union() { body(); tabs(); }
        pocket();
        axle_hole();
        slit();
    }
}

// Two part. The joint is z = 0 for both: the block stands on it, the plate
// hangs under it.
module dowels(down) {
    for(s=[-1, 1]) translate([s*dowel_x, 0, down ? -dowel_h : -0.01]) cylinder(h=dowel_h + 0.01, d=dowel_d, $fn=24);
}
module block() {
    difference() {
        body();
        pocket();
        axle_hole();
        slit();
        translate([0,0,-1]) cylinder(h=base + 2, d=m2_clear, $fn=24);
        translate([0,0,base - m2_head_h]) cylinder(h=m2_head_h + 1, d=m2_head_d, $fn=32);
        dowels(false);
    }
}
module plate() {
    difference() {
        union() {
            translate([0,0,-split_t/2]) cube([rail, rail, split_t], center=true);
            translate([0,0,-split_t]) tabs();
        }
        translate([0,0,-split_t]) slit();
        translate([0,0,-split_t - 1]) cylinder(h=split_t + 2, d=m2_pilot, $fn=24);
        dowels(true);
    }
}
top = two_part ? split_t : 0;   // where the block or cap starts, above the rail's end
if(part == "cap")   { if(print_flip) translate([0,0,cap_h]) rotate([180,0,0]) spine_cap_pulley(); else spine_cap_pulley(); }
if(part == "block") block();
if(part == "plate") { if(print_flip) rotate([180,0,0]) plate(); else translate([0,0,split_t]) plate(); }
if(part == "pair")  { translate([0,0,split_t]) plate(); translate([0,0,split_t + (show_context ? 0 : 8)]) block(); }

if(show_context && !print_flip) %translate([0,0,0]) union() {
    color([0.66,0.71,0.75]) translate([0,0,-60]) linear_extrude(60) difference() {
        square(rail, center=true);
        for(a=[0:90:270]) rotate(a) {
            translate([-3, half - 1.8]) square([6, 3]);
            translate([-5.5, half - 5.5]) square([11, 3.7]);
        }
    }
    color([0.8,0.8,0.8]) translate([0,0,top + pz]) rotate([0,90,0]) difference() {
        cylinder(h=pulley_w, d=pulley_od, center=true);
        cylinder(h=pulley_w + 1, d=axle, center=true);
    }
    color([0.1,0.7,0.9]) for(y=[-run_y, run_y]) translate([0, y, -60]) cylinder(h=60 + top + pz, d=0.6, $fn=8);
}
